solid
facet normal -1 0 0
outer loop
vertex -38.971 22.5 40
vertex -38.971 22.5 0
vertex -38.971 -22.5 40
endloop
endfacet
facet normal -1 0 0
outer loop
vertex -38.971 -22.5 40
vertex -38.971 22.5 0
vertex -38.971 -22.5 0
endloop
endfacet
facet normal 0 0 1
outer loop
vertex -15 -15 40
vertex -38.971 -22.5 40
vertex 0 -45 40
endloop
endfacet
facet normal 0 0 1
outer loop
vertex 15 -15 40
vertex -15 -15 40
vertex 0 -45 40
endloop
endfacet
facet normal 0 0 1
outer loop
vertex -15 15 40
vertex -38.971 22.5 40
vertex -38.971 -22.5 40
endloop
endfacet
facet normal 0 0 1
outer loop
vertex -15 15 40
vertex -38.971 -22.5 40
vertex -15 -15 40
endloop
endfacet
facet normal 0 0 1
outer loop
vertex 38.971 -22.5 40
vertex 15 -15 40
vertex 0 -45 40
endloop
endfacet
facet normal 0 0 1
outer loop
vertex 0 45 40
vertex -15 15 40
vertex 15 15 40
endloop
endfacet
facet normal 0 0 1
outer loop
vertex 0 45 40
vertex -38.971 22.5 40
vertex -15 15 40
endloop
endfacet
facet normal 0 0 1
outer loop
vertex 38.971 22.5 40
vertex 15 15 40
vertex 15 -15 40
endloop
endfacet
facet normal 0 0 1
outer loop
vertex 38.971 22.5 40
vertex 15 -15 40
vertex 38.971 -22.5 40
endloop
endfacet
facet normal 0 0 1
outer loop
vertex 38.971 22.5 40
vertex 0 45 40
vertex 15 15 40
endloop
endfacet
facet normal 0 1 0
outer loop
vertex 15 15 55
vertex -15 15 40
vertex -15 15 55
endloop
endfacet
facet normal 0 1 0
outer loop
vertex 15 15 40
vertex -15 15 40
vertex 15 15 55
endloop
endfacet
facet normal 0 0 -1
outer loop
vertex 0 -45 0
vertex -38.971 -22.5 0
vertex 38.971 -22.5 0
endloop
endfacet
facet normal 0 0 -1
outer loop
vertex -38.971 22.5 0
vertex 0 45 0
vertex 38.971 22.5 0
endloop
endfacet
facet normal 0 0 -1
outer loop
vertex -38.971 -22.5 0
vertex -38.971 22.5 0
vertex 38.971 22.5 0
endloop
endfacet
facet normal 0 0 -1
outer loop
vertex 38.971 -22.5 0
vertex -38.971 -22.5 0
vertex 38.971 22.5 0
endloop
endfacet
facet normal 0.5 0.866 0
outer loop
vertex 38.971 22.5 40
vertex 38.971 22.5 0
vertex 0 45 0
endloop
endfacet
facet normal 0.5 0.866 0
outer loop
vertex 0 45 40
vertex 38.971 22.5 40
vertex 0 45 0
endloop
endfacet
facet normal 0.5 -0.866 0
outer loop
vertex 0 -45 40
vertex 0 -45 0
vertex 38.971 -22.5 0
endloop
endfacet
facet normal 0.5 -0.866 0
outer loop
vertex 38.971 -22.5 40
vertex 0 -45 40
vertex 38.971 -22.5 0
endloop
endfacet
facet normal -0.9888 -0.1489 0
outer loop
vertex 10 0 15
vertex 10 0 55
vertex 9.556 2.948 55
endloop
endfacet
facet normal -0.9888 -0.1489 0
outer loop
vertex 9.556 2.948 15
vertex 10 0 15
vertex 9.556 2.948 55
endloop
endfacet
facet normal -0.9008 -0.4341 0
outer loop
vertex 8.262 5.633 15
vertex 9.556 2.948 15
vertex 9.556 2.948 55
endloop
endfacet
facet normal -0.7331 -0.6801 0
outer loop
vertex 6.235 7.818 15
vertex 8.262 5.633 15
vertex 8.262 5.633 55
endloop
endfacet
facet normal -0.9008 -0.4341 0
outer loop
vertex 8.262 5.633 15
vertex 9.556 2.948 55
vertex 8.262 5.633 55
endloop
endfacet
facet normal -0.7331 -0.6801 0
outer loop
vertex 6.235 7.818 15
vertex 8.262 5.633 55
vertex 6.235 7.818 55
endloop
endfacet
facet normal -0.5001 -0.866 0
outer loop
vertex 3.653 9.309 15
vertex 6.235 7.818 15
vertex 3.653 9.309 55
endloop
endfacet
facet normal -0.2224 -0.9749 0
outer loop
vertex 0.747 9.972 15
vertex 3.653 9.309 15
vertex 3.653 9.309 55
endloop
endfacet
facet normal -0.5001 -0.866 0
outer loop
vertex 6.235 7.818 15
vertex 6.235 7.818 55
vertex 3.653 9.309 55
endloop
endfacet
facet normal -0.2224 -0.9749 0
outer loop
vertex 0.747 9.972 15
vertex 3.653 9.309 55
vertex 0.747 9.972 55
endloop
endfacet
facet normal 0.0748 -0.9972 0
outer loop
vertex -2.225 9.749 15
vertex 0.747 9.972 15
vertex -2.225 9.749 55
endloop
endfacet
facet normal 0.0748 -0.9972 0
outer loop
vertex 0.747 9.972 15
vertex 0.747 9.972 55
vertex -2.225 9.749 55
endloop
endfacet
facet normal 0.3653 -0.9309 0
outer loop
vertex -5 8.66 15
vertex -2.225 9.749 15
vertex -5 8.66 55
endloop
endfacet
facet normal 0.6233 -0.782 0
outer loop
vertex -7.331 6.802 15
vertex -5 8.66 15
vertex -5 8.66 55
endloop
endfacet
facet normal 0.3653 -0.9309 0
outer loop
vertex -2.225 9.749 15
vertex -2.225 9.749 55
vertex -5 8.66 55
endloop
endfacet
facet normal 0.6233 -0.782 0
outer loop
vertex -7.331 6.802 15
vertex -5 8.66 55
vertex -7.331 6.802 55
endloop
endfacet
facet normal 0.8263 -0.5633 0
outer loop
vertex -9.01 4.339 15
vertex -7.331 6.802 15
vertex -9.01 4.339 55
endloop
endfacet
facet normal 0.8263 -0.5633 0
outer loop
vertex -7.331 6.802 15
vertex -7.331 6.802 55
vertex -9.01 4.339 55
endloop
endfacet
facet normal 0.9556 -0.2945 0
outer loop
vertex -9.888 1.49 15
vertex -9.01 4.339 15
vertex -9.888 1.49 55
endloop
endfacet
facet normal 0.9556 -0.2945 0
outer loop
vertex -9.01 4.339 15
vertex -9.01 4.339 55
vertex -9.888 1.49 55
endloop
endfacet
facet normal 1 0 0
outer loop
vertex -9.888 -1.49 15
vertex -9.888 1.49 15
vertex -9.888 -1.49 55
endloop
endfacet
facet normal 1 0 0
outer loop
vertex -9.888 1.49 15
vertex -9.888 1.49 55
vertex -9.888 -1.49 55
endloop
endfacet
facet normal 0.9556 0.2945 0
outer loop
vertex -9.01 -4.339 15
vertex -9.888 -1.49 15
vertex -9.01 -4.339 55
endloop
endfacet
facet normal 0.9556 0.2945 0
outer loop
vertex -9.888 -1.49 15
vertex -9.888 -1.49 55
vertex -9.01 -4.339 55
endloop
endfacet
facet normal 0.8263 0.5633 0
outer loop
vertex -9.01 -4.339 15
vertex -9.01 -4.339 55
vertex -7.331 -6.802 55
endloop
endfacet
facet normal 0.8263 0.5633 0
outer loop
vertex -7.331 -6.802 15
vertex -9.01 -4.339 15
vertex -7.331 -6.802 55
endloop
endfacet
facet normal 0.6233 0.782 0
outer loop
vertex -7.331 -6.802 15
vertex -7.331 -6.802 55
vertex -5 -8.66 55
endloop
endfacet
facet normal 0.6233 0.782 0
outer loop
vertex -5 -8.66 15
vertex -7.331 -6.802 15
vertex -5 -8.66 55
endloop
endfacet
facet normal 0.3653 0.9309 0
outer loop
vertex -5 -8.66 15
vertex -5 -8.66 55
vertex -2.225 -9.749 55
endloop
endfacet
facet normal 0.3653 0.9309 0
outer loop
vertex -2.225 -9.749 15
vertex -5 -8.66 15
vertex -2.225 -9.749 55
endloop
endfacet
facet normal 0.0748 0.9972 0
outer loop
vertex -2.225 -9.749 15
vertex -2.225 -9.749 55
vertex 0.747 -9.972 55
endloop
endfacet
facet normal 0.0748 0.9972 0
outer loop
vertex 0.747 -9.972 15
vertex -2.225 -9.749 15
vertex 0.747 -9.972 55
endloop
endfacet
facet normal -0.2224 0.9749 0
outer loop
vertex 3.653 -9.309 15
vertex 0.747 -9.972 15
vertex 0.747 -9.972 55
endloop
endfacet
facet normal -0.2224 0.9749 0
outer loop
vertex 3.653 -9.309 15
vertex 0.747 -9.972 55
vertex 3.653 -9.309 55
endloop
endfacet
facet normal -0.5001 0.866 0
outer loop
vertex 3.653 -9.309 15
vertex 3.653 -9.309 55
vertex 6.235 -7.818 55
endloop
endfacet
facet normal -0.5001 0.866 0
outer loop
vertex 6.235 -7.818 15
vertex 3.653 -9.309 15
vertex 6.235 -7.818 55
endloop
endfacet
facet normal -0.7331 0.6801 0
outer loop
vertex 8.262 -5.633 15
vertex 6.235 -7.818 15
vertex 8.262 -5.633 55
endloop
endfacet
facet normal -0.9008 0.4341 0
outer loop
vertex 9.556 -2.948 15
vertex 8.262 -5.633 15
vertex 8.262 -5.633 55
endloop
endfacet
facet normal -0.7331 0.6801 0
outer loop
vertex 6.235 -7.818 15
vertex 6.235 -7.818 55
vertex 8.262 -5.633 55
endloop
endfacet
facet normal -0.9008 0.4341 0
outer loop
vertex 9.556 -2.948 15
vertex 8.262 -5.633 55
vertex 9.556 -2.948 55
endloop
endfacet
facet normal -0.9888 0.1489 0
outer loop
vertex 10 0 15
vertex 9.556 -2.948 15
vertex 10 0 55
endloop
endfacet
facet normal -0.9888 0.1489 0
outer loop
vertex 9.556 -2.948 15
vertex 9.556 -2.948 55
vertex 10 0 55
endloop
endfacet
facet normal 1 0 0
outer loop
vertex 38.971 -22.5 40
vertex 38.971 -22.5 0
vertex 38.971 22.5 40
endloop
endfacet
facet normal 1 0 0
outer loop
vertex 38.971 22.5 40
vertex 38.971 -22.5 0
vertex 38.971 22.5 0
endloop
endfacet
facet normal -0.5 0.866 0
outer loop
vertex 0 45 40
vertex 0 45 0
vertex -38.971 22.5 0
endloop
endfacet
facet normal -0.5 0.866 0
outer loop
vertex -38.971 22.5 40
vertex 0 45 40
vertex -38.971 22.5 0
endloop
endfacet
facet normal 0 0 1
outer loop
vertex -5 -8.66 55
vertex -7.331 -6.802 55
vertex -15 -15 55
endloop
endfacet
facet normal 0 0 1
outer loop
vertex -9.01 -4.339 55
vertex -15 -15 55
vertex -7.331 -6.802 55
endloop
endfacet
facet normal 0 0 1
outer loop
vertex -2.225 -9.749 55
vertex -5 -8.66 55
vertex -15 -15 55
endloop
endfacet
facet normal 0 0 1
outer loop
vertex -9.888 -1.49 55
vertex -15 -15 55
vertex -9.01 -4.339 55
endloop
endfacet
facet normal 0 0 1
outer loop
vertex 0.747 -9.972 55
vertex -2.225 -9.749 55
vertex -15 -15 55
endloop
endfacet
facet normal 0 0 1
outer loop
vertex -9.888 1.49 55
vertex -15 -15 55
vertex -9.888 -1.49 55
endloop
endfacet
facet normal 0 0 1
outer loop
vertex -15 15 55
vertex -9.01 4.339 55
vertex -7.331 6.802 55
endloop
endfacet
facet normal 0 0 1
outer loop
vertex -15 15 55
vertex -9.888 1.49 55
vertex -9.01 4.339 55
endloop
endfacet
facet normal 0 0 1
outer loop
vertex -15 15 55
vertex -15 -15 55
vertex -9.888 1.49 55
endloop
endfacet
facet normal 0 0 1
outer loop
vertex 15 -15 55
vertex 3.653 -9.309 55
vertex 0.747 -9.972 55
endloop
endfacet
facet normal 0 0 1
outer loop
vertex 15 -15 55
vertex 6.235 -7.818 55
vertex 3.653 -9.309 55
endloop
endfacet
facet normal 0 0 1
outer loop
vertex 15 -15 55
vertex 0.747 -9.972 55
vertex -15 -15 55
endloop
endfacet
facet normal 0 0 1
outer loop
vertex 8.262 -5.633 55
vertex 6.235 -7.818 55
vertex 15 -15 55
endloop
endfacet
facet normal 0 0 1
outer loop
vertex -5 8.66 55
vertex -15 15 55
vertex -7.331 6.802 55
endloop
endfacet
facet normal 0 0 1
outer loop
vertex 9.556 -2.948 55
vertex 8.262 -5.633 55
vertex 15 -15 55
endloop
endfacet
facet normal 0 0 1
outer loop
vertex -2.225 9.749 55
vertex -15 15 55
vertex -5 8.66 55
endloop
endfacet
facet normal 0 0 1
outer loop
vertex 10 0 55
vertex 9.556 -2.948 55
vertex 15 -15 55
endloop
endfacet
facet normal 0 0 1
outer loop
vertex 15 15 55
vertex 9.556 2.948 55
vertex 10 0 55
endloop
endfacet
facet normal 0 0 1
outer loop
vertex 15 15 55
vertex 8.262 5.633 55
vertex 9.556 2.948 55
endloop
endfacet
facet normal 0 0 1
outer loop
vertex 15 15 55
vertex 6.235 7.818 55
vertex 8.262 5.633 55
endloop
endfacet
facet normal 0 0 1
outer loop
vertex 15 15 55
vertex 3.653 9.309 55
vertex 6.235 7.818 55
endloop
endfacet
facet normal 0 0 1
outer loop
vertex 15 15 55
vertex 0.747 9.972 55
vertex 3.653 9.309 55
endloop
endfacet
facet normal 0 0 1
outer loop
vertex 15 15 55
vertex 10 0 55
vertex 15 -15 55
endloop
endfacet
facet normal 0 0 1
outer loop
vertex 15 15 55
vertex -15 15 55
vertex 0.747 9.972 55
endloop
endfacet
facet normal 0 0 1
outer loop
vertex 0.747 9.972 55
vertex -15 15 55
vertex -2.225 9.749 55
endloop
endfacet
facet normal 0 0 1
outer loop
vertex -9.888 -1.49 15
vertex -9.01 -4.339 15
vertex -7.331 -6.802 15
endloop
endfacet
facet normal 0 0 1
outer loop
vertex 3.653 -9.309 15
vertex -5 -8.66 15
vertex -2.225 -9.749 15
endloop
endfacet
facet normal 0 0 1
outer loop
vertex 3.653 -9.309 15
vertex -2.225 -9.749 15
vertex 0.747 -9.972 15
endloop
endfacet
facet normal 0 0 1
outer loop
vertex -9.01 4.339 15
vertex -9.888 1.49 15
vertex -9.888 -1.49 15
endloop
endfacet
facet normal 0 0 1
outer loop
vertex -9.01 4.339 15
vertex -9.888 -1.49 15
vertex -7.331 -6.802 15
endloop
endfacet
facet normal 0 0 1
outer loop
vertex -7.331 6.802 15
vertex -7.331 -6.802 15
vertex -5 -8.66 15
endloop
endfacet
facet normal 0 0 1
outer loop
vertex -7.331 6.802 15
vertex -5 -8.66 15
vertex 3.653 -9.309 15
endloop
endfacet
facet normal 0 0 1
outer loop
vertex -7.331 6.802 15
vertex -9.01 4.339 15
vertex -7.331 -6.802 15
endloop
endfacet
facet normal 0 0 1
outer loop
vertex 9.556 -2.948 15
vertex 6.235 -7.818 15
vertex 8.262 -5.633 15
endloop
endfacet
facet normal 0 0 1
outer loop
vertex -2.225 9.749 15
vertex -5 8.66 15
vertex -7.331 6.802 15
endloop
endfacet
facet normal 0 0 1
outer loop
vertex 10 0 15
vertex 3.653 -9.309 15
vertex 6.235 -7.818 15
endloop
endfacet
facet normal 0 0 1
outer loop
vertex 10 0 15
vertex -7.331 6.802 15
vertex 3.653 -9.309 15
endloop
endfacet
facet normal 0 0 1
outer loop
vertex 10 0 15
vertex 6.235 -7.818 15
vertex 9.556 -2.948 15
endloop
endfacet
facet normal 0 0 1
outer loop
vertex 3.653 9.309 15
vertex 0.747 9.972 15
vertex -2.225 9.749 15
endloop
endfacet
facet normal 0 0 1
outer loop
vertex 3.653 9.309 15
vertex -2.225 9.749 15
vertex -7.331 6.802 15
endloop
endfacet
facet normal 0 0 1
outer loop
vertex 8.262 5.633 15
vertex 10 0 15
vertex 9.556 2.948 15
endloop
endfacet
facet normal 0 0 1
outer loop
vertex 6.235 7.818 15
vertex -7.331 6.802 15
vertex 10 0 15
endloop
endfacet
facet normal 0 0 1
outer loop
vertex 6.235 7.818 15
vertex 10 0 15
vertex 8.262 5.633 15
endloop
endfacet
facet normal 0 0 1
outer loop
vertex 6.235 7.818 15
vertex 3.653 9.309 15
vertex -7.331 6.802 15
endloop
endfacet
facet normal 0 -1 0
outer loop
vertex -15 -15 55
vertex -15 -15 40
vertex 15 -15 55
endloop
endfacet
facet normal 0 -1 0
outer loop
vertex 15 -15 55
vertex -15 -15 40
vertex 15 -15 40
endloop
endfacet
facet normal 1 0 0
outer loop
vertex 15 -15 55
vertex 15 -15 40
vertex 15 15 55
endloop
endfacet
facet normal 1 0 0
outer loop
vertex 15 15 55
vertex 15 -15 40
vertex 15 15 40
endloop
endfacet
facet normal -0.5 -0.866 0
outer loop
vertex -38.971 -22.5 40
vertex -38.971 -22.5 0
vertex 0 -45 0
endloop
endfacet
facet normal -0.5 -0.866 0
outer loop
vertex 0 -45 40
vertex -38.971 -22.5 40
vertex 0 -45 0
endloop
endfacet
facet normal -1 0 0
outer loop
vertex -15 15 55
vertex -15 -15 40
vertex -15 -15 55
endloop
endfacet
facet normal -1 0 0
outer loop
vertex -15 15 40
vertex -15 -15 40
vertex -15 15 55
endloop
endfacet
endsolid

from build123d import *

# Parameters (mm, degrees)
F1_DEPTH = 40
F2_W     = 30
F2_H     = 30
F3_DEPTH = 15
F4_R     = 10
F5_DEPTH = 40


with BuildPart() as f1:
    # F0 (on Top) → F1 (new body)
    with BuildSketch(Plane.XY):
        Polygon((38.971143, -22.5), (38.971143, 22.5), (0, 45), (-38.971143, 22.5), (-38.971143, -22.5), (0, -45), align=None)
    extrude(amount=F1_DEPTH)

    # F2 (on face) → F3 (join)
    with BuildSketch(Plane.XY.offset(40)):
        Rectangle(F2_W, F2_H)
    extrude(amount=F3_DEPTH)

    # F4 (on face) → F5 (cut)
    with BuildSketch(Plane.XY.offset(55)):
        Circle(F4_R)
    extrude(amount=-F5_DEPTH, mode=Mode.SUBTRACT)


solid = f1.part
